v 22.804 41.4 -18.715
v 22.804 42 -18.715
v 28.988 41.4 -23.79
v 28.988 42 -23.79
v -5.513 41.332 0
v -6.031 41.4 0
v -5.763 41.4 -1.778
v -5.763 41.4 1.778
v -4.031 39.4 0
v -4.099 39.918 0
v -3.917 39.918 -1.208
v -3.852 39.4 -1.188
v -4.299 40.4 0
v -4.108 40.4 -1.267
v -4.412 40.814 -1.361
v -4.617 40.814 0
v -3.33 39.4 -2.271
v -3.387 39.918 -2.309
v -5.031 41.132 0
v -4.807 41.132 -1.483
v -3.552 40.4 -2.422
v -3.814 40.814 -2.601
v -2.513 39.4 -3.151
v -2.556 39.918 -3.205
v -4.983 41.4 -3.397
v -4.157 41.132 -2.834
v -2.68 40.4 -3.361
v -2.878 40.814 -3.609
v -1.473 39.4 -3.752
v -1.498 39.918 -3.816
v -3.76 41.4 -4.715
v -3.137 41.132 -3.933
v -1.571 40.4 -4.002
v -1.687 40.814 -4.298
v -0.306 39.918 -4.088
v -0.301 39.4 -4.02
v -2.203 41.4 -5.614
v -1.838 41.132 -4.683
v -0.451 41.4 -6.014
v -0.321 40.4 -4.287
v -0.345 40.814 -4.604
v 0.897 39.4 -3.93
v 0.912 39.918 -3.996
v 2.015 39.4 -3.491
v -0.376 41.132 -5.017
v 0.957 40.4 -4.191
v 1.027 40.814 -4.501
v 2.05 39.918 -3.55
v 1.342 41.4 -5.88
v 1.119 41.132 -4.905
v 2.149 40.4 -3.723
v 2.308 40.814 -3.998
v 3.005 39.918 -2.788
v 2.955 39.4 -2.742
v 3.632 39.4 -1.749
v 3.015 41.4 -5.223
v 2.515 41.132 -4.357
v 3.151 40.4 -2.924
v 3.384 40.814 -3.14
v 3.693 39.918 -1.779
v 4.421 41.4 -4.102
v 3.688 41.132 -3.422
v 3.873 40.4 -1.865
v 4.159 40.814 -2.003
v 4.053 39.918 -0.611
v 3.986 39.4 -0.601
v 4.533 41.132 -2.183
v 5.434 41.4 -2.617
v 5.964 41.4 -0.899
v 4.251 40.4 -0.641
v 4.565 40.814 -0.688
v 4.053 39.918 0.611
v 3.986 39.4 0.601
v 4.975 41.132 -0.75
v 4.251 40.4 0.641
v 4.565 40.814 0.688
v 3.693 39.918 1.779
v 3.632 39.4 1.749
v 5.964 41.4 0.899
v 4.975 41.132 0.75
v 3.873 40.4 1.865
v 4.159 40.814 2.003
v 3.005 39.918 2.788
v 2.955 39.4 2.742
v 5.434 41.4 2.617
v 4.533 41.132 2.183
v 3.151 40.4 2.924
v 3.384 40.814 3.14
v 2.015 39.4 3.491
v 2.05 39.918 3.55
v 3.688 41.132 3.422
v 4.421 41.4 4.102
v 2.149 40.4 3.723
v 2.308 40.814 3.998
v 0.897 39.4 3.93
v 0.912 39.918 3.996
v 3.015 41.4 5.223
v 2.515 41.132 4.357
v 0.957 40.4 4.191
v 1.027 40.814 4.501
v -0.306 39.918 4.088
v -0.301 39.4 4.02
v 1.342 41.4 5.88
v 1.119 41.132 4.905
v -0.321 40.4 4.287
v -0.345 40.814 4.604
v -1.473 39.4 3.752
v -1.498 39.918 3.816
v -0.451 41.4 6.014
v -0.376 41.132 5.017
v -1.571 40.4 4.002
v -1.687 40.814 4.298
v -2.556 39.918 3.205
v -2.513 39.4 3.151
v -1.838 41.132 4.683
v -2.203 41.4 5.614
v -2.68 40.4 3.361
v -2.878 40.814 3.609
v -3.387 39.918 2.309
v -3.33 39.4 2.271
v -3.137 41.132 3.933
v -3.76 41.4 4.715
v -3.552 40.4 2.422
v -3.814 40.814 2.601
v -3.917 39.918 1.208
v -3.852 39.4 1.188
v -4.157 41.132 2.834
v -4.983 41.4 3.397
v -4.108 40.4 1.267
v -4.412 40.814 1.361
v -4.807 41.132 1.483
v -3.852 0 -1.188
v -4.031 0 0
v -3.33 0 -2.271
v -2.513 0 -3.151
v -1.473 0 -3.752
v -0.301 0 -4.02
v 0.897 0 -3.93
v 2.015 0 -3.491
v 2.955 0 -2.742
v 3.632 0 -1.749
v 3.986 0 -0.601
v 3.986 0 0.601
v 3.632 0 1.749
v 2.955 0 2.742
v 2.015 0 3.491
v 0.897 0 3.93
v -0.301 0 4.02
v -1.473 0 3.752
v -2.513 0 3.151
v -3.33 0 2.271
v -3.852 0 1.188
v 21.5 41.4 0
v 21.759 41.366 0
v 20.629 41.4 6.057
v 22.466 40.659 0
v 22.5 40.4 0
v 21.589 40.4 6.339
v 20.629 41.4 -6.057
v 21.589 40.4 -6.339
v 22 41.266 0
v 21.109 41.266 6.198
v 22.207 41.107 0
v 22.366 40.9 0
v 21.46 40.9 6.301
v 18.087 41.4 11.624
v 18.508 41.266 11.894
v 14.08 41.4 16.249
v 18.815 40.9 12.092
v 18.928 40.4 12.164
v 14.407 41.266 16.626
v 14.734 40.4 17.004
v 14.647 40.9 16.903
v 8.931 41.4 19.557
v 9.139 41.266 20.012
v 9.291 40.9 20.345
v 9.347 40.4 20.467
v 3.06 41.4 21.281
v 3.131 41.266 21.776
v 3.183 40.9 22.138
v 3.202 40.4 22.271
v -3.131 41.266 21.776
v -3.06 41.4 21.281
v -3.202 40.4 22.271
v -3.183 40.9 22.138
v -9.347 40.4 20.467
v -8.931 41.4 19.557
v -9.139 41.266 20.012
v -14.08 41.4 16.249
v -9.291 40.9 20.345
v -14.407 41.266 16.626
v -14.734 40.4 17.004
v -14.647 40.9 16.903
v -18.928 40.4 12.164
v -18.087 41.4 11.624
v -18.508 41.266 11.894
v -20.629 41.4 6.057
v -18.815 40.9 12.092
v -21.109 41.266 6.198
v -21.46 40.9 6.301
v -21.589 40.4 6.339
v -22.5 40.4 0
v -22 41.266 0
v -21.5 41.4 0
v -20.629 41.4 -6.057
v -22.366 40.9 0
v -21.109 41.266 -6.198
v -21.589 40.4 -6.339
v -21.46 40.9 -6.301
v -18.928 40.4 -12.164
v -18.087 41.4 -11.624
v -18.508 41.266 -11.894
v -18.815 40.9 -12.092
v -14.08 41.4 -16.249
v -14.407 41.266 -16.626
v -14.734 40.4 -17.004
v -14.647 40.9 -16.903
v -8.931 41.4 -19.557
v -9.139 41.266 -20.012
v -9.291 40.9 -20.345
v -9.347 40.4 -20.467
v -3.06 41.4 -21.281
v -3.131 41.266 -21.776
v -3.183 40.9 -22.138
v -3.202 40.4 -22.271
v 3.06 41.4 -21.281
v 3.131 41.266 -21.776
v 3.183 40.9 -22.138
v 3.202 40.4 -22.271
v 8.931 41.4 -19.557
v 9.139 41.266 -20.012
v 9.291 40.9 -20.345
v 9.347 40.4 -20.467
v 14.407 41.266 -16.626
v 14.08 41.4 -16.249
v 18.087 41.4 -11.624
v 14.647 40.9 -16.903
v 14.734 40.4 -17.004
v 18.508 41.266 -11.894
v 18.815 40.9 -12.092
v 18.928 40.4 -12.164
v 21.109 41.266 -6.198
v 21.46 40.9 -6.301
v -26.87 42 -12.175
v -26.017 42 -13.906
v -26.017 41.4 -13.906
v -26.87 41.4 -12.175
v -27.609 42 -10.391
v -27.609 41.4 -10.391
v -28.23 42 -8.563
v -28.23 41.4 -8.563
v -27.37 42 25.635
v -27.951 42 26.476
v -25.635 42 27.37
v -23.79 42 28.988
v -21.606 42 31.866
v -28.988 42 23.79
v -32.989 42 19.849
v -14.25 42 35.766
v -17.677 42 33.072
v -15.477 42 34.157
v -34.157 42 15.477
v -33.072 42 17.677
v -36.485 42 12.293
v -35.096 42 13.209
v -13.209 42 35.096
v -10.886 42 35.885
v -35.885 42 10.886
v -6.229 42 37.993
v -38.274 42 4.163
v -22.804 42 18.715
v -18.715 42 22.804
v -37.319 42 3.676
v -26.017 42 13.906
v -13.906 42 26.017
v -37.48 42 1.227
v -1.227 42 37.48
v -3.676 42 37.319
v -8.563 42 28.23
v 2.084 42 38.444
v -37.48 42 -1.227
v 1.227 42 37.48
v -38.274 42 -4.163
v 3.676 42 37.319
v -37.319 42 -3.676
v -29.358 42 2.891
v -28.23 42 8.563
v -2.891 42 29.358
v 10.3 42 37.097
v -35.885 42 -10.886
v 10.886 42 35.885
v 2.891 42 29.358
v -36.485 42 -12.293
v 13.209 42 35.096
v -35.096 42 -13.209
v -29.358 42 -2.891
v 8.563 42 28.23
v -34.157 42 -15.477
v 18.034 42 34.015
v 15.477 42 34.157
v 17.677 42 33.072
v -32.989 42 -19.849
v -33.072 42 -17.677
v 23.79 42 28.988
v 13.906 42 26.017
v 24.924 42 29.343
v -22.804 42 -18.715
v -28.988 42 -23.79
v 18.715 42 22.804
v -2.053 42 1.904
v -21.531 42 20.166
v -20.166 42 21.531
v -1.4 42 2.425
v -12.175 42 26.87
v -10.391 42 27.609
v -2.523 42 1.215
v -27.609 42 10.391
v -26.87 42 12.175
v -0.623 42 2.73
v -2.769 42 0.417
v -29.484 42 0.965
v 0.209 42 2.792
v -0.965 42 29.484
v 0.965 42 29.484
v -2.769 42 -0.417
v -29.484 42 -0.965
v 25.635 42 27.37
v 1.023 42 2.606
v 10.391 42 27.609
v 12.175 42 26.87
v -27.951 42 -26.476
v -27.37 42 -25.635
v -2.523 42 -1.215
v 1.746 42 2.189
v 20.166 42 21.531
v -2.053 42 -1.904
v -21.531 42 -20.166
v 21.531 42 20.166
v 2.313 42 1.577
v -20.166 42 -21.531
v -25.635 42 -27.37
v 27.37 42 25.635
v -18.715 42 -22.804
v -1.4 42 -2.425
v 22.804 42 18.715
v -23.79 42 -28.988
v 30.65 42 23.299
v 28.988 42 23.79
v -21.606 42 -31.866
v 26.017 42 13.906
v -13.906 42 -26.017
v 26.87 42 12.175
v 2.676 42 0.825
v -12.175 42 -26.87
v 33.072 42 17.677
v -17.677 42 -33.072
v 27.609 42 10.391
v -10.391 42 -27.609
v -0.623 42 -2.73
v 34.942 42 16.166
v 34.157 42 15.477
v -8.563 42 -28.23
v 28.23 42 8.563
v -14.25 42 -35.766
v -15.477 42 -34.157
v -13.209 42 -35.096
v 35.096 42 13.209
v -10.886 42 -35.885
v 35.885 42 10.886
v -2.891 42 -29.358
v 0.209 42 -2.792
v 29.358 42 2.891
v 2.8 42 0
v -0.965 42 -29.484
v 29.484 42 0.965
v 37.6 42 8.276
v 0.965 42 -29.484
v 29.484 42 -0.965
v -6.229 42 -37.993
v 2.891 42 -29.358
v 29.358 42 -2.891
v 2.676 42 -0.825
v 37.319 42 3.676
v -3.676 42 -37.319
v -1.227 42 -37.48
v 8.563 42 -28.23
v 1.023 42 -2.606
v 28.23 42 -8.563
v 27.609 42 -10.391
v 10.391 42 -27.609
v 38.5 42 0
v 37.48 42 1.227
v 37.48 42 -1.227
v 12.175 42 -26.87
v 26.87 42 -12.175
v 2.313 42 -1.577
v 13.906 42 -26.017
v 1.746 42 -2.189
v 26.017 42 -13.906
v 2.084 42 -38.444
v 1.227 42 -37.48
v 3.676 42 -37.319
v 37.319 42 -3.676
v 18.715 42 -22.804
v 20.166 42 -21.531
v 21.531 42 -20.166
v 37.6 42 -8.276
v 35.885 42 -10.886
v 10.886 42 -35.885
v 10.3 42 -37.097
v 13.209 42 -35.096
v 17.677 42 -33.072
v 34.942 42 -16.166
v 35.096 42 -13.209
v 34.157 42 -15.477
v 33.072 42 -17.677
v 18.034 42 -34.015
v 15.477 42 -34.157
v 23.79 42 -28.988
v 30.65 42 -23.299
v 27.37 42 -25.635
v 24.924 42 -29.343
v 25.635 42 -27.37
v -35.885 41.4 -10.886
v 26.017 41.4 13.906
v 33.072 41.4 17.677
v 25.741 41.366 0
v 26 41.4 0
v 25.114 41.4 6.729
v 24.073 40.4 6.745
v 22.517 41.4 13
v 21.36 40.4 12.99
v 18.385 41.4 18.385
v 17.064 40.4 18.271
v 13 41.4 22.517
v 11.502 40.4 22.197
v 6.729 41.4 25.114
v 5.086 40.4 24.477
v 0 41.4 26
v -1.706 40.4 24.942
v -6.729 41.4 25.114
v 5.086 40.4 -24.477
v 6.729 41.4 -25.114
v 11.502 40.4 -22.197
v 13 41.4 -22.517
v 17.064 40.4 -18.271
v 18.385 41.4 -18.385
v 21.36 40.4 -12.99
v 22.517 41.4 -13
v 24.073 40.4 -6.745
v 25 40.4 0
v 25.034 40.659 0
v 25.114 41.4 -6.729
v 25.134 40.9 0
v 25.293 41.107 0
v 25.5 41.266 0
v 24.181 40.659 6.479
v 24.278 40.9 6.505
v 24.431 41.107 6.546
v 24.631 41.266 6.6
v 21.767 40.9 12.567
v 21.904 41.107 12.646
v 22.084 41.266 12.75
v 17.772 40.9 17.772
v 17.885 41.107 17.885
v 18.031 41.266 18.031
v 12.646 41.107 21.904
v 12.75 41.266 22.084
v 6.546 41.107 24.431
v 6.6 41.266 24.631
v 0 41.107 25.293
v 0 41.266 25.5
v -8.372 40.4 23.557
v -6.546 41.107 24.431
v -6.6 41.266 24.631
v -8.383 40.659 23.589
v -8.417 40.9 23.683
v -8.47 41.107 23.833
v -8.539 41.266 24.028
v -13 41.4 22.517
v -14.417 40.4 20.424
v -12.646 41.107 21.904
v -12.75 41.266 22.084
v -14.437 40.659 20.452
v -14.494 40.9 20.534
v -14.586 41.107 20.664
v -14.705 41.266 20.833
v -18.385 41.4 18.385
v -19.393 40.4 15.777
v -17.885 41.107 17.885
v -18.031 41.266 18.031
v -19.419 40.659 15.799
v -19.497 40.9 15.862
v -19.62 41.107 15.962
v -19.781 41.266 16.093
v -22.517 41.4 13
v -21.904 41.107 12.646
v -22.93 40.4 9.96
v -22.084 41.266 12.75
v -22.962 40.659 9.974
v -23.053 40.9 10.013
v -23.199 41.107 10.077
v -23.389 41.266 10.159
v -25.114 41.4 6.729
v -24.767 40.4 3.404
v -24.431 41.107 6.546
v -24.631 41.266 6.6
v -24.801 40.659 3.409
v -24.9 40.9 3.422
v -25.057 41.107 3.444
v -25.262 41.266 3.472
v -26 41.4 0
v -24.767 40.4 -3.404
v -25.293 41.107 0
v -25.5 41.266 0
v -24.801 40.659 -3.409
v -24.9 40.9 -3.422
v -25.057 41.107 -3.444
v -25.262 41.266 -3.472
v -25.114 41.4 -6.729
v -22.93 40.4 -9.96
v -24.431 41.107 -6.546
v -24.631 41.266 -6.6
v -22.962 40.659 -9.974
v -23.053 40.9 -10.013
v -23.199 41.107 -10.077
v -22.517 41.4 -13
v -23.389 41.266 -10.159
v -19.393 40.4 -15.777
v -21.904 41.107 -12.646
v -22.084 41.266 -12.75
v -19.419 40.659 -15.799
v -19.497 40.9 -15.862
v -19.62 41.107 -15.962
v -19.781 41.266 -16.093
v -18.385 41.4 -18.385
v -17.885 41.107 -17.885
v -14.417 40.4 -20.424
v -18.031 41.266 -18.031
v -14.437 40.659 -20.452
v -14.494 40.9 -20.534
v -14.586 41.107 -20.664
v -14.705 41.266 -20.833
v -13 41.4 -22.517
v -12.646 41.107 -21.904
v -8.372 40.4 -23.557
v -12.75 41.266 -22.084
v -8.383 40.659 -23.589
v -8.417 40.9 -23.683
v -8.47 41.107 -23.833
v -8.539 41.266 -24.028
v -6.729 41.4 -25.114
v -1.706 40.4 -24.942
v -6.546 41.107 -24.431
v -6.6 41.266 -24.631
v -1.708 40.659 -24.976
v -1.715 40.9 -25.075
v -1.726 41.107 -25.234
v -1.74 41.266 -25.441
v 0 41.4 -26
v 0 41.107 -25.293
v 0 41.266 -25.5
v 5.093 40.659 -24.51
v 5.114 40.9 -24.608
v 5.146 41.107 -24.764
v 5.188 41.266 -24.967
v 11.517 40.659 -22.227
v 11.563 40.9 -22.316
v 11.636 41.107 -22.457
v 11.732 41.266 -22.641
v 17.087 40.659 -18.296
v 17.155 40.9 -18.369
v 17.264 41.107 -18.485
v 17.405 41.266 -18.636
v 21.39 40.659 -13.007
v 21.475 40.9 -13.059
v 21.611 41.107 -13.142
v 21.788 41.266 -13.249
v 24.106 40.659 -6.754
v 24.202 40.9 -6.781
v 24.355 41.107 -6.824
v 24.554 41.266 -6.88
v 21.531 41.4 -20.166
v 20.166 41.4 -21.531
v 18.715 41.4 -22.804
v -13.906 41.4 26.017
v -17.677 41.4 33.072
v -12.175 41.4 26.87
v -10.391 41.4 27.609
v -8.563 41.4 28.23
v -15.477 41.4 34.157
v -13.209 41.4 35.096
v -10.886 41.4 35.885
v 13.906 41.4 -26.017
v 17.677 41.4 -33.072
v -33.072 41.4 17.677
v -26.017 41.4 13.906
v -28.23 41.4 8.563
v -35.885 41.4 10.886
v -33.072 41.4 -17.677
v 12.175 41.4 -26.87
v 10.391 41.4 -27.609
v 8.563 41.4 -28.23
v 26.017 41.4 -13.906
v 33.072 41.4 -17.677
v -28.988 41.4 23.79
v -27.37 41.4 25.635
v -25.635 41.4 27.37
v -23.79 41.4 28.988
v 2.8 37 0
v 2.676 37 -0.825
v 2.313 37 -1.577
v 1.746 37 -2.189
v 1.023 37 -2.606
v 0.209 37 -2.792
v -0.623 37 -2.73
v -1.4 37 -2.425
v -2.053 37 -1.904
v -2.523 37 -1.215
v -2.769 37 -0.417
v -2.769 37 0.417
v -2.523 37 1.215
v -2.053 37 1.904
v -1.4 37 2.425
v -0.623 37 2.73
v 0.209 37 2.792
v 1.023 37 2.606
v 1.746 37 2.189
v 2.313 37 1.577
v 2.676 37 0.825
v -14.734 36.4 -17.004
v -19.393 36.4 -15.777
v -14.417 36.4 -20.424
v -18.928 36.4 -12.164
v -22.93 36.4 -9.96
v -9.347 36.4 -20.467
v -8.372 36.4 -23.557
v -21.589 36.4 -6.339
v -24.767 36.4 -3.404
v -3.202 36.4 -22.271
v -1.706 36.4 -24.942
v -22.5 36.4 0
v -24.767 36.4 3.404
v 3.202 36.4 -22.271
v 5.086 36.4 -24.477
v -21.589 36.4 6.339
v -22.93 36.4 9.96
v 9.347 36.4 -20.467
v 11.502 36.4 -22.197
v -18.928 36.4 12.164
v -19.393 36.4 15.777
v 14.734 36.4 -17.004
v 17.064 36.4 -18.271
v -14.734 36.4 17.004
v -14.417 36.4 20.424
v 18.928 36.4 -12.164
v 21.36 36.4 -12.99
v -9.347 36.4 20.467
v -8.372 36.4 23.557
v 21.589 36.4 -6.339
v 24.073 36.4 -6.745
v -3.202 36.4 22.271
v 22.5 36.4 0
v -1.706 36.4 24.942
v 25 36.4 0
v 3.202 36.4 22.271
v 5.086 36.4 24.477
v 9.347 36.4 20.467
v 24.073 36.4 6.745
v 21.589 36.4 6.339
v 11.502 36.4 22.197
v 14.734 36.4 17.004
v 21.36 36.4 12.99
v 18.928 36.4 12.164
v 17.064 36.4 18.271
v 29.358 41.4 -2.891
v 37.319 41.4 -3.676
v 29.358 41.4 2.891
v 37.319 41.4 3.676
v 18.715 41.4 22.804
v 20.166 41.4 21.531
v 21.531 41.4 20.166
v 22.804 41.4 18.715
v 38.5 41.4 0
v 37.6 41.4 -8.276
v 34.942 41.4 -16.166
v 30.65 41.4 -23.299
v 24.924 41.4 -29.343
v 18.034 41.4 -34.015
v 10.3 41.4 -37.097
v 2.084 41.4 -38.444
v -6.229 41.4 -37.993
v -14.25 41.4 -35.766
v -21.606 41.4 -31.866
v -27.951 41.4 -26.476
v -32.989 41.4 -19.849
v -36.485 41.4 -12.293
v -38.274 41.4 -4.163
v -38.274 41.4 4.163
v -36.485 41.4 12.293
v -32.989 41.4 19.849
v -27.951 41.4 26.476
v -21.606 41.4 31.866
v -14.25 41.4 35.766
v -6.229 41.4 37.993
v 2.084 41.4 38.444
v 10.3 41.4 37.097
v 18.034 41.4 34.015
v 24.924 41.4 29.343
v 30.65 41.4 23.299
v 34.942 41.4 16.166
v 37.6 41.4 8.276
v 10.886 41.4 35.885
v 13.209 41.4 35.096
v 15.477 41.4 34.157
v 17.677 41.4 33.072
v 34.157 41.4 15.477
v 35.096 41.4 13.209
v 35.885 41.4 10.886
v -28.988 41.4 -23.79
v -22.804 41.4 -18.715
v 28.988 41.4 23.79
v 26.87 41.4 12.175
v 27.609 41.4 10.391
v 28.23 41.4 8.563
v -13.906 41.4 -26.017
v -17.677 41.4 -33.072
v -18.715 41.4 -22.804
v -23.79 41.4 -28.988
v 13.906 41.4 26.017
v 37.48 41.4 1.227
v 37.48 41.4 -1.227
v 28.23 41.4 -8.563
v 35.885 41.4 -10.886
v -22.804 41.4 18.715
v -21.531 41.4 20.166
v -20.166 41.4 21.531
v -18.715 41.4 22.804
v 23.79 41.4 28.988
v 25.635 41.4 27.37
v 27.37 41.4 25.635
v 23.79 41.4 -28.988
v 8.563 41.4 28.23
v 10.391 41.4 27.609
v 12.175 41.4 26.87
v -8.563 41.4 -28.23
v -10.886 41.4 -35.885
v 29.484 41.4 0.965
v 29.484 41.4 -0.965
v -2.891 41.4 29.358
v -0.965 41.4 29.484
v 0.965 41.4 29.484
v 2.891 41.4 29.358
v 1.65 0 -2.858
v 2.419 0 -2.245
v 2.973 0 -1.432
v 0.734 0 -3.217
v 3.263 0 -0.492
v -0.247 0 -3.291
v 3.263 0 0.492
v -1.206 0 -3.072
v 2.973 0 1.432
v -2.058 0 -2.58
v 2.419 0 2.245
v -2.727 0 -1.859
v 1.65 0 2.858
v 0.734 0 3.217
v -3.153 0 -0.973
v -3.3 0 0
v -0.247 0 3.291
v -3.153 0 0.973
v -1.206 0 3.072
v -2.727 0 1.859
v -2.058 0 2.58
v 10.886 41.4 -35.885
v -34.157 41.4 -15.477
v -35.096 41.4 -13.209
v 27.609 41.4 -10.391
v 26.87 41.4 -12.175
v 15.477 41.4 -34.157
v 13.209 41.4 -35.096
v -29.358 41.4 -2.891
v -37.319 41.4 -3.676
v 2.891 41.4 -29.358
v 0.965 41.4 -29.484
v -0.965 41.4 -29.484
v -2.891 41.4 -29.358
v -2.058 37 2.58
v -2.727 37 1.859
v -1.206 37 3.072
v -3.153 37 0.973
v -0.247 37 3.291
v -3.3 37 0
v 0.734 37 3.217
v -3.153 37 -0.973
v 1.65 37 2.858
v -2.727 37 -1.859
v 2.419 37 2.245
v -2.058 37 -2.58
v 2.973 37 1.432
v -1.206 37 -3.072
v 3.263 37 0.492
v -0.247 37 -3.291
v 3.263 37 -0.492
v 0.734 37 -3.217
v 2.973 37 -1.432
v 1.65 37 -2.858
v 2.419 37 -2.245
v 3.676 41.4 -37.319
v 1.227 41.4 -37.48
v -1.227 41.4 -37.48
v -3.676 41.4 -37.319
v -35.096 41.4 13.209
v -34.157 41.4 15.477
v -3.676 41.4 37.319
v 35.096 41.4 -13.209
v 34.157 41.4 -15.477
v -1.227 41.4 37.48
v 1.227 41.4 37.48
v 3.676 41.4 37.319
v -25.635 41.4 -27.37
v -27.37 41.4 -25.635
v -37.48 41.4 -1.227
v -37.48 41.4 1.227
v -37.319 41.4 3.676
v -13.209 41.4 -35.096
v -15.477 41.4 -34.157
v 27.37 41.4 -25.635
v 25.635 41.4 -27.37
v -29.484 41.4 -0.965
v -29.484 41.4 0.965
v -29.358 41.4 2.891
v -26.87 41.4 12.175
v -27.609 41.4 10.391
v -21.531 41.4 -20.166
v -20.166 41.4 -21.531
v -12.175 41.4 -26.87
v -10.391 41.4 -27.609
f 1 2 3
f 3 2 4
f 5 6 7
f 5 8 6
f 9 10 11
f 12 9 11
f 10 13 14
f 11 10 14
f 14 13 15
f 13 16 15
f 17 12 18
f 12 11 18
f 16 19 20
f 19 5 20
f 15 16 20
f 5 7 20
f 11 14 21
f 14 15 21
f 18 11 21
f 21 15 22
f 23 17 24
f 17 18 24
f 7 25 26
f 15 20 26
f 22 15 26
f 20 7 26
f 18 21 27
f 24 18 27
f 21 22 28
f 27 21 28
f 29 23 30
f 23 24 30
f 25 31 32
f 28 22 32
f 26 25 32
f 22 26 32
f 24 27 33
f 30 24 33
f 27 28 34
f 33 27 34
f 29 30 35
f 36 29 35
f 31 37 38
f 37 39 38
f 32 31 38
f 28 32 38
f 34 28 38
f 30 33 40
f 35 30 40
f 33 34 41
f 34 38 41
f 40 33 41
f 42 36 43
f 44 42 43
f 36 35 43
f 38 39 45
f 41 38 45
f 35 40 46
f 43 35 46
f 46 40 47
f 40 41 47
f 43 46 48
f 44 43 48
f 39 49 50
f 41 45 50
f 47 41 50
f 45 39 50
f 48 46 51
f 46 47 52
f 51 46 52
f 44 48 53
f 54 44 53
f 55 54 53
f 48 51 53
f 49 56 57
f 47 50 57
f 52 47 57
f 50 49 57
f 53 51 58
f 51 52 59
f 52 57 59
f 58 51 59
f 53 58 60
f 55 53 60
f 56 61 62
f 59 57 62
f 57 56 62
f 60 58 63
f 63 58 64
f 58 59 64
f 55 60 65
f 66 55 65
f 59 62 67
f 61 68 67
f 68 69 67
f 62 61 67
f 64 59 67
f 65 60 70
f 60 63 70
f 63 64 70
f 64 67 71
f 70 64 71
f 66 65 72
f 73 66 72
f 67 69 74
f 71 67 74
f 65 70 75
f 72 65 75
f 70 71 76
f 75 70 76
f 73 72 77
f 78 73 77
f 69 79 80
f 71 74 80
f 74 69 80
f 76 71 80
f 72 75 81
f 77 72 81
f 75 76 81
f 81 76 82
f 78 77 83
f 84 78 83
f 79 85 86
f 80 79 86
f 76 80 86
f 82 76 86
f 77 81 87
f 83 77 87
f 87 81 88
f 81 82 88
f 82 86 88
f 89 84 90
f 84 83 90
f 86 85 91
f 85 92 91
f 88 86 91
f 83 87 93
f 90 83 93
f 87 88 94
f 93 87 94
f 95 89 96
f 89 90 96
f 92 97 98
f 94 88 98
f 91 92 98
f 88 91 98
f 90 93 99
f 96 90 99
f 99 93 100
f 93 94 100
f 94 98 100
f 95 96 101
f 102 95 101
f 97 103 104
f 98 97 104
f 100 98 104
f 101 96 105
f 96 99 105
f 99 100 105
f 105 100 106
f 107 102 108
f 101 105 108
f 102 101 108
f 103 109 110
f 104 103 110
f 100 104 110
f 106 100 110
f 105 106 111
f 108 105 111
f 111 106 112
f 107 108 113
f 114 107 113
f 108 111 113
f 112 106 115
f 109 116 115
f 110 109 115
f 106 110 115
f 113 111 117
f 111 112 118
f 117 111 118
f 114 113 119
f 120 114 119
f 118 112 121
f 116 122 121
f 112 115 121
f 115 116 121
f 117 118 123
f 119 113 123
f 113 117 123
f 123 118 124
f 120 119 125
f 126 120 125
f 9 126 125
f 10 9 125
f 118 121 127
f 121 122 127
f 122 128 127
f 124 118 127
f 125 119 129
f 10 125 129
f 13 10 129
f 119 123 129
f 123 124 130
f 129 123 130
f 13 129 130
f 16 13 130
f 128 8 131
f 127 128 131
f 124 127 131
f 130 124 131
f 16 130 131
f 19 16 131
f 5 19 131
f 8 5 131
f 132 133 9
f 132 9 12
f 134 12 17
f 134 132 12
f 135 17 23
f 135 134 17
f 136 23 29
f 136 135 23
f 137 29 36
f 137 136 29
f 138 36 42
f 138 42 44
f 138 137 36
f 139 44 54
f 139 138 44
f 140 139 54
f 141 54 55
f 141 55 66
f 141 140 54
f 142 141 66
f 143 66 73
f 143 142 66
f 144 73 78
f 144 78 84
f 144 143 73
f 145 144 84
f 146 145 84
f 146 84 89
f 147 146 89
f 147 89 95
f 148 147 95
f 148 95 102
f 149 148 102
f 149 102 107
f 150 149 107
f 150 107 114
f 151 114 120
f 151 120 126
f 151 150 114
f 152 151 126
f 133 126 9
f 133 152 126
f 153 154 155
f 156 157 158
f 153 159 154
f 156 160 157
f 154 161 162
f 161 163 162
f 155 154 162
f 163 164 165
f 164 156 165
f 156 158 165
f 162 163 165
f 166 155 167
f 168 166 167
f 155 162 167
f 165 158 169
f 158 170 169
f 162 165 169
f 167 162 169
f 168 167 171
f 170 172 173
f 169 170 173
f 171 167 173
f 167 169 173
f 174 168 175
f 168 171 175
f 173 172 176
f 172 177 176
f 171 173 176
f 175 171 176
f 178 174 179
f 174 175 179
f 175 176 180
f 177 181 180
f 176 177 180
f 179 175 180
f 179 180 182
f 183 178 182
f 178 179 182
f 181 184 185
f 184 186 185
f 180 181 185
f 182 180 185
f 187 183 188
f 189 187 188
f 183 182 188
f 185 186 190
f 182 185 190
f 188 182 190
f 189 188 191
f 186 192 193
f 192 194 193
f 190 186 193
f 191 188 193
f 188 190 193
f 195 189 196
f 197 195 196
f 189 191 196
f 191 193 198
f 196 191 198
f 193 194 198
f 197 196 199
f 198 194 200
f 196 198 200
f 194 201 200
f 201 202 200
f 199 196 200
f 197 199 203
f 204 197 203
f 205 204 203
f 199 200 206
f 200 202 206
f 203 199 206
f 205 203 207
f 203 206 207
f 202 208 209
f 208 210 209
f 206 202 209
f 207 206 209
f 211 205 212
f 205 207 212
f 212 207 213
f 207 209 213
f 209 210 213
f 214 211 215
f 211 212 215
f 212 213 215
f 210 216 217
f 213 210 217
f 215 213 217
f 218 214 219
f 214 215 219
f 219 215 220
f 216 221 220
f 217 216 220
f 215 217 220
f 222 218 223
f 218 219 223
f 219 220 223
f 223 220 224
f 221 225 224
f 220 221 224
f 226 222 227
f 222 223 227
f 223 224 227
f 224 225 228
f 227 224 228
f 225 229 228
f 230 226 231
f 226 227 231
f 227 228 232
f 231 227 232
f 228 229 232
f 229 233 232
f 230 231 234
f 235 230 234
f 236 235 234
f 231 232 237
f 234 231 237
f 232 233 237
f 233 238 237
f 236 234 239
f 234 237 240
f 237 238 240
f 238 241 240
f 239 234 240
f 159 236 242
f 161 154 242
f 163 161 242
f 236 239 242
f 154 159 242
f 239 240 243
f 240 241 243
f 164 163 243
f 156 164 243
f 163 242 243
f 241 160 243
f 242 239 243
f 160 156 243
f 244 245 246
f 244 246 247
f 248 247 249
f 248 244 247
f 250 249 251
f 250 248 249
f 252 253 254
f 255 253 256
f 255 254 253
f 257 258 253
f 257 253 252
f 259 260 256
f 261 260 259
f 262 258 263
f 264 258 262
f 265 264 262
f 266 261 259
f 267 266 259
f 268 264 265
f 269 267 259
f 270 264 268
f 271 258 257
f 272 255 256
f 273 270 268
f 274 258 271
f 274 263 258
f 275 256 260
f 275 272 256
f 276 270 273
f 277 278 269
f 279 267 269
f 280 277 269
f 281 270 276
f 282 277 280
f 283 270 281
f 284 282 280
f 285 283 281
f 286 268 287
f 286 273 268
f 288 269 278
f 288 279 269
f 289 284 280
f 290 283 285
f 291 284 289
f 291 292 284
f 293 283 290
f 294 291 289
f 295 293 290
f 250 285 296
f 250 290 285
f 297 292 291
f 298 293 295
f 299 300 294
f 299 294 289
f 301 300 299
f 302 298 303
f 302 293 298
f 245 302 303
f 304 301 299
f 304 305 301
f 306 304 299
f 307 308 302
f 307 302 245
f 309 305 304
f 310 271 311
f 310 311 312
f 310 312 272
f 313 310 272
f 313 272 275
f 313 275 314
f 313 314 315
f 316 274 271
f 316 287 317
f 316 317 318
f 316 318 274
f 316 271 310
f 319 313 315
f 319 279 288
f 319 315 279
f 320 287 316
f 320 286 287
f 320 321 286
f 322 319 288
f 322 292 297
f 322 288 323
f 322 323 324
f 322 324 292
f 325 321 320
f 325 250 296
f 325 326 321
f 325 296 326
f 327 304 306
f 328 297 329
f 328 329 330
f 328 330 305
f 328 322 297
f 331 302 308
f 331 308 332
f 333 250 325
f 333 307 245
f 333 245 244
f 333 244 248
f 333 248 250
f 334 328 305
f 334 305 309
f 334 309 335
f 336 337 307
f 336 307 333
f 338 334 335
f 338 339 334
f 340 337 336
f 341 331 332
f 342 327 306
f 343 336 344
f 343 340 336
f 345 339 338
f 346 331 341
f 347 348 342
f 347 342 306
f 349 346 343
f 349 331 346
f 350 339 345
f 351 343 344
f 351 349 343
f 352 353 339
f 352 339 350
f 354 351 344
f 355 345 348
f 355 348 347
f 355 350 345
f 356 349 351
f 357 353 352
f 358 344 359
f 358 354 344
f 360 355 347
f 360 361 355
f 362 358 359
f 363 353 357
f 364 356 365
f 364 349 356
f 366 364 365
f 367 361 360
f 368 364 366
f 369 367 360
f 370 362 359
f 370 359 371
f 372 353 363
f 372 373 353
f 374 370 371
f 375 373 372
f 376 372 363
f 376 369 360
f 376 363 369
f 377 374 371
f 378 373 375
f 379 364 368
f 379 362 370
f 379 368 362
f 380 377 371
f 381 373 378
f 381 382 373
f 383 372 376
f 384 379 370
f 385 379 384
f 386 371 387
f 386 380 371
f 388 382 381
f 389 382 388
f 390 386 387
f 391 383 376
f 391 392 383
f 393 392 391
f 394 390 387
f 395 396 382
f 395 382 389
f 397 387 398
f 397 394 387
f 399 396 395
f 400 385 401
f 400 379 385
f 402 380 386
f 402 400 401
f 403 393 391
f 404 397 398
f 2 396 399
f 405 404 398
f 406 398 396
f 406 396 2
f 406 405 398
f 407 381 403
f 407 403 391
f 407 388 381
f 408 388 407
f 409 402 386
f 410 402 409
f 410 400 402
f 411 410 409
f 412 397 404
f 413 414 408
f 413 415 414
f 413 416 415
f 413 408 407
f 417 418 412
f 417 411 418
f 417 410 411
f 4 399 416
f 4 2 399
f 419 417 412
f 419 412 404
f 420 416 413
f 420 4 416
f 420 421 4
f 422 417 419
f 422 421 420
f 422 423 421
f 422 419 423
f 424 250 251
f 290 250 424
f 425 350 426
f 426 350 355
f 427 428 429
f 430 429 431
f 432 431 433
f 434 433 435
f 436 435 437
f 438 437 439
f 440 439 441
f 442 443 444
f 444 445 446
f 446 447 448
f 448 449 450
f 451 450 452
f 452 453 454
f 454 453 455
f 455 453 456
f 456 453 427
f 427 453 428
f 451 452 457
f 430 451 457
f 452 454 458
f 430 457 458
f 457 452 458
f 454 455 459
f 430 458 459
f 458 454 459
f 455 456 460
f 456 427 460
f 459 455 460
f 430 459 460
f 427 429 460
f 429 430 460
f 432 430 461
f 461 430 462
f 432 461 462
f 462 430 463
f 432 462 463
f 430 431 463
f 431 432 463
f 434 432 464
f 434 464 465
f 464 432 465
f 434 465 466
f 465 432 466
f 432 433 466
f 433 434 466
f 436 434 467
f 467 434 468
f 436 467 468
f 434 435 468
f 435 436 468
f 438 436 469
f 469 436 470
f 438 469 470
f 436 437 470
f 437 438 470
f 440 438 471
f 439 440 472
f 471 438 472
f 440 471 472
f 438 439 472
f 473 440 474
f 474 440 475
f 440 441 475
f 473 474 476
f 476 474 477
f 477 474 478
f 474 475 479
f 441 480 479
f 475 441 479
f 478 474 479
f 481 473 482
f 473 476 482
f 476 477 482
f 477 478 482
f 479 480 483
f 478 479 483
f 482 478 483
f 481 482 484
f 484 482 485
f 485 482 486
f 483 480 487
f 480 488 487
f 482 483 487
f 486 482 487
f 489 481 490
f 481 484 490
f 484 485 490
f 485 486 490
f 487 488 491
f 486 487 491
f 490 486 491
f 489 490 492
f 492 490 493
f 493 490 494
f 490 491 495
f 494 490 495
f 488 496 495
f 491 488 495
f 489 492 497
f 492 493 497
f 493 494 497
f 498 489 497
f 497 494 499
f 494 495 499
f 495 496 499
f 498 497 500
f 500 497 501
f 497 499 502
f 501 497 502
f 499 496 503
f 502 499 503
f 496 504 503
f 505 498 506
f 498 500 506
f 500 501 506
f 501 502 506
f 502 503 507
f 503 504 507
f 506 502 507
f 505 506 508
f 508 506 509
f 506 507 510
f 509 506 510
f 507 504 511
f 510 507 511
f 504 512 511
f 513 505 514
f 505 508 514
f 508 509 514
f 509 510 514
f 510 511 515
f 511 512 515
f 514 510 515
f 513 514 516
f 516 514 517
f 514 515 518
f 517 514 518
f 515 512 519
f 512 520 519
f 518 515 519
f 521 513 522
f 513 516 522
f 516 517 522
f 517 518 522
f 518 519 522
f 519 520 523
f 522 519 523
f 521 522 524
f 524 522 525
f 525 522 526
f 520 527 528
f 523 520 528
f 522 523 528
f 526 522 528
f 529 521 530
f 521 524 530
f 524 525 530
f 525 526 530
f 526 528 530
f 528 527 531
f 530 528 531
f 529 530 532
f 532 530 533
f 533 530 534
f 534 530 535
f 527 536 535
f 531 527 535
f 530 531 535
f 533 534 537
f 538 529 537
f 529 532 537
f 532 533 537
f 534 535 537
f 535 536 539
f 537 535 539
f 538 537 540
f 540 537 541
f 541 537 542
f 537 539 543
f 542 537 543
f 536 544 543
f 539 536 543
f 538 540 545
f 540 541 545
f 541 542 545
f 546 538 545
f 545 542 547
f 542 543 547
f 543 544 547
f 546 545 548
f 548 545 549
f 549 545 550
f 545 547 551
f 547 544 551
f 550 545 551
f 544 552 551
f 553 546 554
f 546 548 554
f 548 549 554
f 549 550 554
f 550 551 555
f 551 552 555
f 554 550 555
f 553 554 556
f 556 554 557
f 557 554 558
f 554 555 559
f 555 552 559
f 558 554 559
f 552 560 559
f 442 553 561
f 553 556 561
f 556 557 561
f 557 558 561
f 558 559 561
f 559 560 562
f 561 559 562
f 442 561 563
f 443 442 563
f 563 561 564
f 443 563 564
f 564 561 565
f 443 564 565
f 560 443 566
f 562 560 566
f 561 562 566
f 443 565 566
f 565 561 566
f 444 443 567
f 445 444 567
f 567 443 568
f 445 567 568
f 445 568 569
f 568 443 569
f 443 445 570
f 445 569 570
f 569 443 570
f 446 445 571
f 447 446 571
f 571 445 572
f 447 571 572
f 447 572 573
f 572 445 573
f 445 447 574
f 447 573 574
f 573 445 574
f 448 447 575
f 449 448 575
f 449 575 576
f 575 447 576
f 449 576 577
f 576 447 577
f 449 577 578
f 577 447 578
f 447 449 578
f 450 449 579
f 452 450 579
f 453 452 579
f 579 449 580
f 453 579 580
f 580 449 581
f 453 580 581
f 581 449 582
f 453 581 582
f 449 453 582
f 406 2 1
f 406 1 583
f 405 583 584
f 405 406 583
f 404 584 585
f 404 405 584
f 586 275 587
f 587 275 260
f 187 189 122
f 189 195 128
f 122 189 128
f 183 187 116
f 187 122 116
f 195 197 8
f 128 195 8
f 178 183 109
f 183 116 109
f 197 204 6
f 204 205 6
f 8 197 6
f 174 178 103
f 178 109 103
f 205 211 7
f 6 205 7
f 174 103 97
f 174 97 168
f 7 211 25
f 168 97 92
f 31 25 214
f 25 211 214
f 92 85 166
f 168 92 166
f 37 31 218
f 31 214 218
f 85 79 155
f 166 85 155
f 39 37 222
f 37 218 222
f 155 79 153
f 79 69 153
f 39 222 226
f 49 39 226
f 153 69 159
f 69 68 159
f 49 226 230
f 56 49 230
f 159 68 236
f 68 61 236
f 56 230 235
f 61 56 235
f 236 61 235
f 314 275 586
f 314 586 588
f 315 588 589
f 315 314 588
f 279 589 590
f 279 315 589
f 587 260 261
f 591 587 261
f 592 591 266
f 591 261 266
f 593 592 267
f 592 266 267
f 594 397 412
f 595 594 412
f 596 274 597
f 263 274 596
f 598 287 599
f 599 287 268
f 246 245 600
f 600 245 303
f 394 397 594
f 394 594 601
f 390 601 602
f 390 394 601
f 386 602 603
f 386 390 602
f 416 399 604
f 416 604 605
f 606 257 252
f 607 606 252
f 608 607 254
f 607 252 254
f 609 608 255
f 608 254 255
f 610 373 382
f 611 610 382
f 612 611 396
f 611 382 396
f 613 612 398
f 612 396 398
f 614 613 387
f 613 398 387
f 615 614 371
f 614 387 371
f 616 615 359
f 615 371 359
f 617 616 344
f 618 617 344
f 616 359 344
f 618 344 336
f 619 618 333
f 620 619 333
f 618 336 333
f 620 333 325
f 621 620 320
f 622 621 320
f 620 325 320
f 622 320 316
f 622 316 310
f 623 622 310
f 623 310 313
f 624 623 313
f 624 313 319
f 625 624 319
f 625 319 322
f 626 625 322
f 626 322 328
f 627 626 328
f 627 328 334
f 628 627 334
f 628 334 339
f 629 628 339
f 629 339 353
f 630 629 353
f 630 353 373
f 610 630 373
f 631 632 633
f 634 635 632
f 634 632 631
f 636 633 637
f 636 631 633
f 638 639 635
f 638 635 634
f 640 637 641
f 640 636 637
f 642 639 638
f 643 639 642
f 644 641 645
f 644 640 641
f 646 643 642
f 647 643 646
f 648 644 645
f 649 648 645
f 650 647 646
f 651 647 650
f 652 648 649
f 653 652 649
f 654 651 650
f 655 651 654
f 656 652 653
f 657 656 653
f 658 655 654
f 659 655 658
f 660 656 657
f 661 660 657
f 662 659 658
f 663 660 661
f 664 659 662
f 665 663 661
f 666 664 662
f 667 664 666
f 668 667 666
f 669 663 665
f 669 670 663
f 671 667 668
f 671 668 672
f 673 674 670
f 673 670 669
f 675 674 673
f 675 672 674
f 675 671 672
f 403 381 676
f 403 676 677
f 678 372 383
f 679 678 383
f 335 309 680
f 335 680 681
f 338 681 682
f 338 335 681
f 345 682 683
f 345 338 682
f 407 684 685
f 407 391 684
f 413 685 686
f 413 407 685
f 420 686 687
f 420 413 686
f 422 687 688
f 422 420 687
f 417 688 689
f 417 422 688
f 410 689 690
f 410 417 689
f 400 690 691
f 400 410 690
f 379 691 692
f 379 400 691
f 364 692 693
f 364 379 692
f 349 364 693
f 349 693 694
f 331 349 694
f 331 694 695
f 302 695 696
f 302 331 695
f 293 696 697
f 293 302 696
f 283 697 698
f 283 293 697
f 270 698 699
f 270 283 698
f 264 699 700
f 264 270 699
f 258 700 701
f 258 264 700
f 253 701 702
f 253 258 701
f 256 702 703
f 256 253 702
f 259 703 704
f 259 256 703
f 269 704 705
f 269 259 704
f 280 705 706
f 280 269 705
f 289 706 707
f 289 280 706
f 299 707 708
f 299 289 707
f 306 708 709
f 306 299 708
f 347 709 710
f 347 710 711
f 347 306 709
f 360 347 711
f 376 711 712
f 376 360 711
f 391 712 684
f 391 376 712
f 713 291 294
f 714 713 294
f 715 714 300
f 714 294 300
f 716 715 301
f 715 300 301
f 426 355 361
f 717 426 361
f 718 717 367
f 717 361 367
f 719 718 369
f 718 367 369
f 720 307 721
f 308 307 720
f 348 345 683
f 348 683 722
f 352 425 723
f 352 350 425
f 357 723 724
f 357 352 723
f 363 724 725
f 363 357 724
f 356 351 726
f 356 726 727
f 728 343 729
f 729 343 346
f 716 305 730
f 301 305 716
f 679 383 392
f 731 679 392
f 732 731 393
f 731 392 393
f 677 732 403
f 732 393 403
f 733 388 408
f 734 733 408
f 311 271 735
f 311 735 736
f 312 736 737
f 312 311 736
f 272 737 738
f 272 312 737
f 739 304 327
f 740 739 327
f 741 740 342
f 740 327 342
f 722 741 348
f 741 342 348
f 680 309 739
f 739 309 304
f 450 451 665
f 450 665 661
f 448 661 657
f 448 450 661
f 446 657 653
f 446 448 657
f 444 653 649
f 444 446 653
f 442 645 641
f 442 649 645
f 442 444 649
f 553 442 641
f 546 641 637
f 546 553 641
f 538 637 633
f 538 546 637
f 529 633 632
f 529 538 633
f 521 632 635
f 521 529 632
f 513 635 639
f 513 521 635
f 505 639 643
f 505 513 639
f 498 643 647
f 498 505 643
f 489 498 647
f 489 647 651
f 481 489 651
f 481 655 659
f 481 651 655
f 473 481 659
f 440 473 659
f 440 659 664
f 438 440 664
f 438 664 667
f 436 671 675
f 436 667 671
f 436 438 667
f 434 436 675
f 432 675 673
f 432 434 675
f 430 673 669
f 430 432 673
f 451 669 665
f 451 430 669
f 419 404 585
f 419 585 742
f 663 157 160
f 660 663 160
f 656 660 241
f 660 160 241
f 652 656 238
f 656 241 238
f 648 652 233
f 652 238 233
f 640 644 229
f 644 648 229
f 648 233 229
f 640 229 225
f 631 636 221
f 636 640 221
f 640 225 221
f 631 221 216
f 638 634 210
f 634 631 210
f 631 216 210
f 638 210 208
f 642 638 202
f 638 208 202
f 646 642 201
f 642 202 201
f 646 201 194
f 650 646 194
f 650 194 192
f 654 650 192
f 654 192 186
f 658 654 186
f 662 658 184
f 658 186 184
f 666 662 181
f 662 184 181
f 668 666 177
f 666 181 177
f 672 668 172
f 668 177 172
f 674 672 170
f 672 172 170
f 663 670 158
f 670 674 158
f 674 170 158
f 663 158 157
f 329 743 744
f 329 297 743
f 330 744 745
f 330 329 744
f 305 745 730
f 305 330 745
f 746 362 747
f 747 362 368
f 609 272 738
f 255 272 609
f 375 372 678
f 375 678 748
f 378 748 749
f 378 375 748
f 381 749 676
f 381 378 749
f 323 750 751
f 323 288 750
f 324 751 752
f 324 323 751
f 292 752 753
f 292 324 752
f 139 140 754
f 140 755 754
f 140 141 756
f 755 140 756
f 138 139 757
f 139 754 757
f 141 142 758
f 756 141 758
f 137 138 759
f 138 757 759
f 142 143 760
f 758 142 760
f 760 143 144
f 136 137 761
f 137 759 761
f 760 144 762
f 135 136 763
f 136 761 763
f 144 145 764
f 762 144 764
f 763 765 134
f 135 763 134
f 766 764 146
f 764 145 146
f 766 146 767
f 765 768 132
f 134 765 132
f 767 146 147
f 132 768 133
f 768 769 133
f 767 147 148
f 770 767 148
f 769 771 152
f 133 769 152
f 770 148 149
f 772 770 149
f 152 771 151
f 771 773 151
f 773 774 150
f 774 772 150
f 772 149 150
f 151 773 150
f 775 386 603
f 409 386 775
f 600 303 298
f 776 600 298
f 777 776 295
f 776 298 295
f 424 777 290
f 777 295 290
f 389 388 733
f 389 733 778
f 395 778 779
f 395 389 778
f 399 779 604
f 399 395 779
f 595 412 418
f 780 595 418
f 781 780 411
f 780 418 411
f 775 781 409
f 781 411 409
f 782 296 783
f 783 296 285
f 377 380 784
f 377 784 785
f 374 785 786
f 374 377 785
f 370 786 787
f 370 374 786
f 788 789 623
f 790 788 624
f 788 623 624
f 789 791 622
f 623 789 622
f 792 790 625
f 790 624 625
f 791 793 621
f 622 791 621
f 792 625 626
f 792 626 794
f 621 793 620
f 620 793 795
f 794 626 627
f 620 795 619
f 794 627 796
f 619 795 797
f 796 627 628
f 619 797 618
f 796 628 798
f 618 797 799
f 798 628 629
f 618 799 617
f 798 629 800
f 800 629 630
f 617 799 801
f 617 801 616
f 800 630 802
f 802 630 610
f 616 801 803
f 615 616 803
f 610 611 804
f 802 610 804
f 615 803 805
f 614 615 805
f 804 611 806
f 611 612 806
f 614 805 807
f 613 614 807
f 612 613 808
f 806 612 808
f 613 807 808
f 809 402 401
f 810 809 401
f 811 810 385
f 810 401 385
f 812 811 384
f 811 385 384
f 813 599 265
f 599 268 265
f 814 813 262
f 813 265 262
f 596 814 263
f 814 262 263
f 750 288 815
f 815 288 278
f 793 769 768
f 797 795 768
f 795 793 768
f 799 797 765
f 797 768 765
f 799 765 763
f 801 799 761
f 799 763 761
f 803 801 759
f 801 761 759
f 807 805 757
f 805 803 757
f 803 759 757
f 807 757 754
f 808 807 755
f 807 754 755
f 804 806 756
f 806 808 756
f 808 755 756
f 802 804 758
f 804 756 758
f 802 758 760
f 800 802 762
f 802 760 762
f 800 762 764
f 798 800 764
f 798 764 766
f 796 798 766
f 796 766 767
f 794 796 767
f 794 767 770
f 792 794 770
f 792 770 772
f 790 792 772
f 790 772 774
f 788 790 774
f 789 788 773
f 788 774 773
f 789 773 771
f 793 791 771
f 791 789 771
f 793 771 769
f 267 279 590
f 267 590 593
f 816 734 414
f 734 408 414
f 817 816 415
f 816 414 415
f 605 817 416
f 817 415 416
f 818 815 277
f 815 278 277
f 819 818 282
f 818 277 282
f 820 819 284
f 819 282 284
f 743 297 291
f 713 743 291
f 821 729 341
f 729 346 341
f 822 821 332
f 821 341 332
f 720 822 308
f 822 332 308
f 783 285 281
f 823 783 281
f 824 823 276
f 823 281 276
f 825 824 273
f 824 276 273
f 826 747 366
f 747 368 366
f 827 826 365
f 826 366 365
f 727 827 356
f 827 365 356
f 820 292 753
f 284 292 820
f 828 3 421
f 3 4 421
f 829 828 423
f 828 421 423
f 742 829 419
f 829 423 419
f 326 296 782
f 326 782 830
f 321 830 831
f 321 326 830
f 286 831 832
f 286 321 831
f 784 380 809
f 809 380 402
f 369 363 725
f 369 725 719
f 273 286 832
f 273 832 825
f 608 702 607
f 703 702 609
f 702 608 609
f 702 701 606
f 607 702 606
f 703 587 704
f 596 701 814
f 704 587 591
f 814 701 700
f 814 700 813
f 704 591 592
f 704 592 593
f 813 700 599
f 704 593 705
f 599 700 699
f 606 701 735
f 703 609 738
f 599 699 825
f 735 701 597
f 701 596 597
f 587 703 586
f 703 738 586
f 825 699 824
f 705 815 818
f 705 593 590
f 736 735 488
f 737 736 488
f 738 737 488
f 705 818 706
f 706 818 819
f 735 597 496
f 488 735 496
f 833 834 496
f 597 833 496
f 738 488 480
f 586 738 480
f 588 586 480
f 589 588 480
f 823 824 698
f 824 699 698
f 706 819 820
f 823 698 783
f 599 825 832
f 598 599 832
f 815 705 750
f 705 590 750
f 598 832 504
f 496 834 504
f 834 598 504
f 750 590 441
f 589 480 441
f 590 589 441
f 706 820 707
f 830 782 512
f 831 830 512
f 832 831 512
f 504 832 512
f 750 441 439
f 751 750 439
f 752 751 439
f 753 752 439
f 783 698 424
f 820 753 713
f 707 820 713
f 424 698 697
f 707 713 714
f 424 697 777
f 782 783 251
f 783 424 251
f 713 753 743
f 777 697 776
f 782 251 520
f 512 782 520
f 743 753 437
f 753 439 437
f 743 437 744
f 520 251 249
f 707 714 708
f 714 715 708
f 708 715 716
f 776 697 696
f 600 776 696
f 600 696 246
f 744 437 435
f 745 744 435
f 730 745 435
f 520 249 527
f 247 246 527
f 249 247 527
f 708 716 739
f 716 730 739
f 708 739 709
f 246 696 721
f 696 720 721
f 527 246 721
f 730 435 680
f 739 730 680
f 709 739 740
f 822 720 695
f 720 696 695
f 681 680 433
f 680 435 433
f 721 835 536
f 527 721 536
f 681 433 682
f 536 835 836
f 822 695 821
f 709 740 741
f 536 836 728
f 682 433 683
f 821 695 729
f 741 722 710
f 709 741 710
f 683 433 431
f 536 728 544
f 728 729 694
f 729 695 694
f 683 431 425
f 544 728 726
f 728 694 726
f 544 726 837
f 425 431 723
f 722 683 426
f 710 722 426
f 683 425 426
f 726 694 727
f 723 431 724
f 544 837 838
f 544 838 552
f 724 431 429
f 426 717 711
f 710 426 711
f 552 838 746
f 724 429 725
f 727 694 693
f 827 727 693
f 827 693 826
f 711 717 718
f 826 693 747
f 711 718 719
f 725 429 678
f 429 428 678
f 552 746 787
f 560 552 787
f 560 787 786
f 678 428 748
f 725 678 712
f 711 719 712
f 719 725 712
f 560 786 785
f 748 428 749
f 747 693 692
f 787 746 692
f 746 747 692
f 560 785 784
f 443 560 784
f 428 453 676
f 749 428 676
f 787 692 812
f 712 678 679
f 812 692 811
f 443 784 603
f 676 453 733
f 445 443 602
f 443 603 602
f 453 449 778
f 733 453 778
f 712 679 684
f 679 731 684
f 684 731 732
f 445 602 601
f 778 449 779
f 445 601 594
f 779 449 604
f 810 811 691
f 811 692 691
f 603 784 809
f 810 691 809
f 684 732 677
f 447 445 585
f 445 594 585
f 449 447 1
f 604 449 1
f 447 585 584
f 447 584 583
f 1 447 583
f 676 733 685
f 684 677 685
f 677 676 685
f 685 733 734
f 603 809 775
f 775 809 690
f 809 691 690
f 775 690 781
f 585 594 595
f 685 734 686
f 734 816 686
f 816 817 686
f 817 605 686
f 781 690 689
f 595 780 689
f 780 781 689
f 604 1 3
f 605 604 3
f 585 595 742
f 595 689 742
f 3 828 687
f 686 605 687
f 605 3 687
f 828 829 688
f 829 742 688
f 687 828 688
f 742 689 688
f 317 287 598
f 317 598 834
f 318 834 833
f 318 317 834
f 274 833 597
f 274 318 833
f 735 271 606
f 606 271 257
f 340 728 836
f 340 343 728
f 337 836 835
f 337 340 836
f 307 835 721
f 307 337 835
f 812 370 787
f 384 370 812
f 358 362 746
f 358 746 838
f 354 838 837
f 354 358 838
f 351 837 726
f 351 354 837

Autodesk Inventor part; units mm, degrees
ref_plane "YZ Plane" through (0, 0, 0) normal (1, 0, 0) x (0, 1, 0)
ref_plane "XZ Plane" through (0, 0, 0) normal (0, 1, 0) x (-1, 0, 0)
ref_plane "XY Plane" through (0, 0, 0) normal (0, 0, 1) x (1, 0, 0)
sketch "Sketch1" plane through (0, 0, 0) normal (0, 1, 0) x (-1, 0, 0)
  circle A0 centre (0, 0) radius 4.0309
  circle A1 centre (0, 0) radius 3.3
  dimension "d0" = 6.6
extrude "Extrusion1" add sketch "Sketch1" along normal blind 42
sketch "Sketch2" plane through (0, 42, 0) normal (0, 1, 0) x (1, 0, 0)
  circle A0 centre (0, 0) radius 4.0309 projected
  circle A1 centre (0, 0) radius 3.3 projected
  circle A2 centre (0, 0) radius 2.8
  dimension "d3" = 5.6
extrude "Extrusion2" add sketch "Sketch2" against normal blind 5 contours A1
sketch "Sketch3" plane through (0, 42, 0) normal (0, 1, 0) x (1, 0, 0)
  circle A0 centre (0, 0) radius 38.5
  circle A1 centre (0, 0) radius 25
  circle A2 centre (0, 0) radius 4.0309 projected
  circle A3 centre (0, 0) radius 2.8 projected
  line L0 (0, 4.0309) -> (38.2884, 4.0309)
  line L1 (0, -4.0309) -> (38.2884, -4.0309)
  line L2 (-3.4908, -2.0154) -> (-22.635, 31.1433)
  line L3 (3.4908, 2.0154) -> (-15.6534, 35.1742)
  line L4 (3.4908, -2.0154) -> (-15.6534, -35.1742)
  line L5 (-3.4908, 2.0154) -> (-22.635, -31.1433)
  point P0 (24.6729, 4.0309)
  point P1 (24.6729, -4.0309)
  point P2 (-4.6544, 0)
  point P3 (-3.4908, 2.0154)
  point P4 (2.3272, 4.0309)
  point P5 (-8.8456, 23.3828)
  point P6 (-15.8273, 19.3519)
  point P7 (-15.8273, -19.3519)
  point P8 (-8.8456, -23.3828)
  point P9 (2.3272, -4.0309)
  point P10 (-3.4908, -2.0154)
  point P11 (-22.635, -31.1433)
  point P12 (-22.635, 31.1433)
  point P13 (3.4908, -2.0154)
  point P14 (-15.6534, -35.1742)
  point P15 (-15.6534, 35.1742)
  dimension "d10" = 77
  dimension "d11" = 50
  dimension "d28" = 360
extrude "Extrusion3" add sketch "Sketch3" against normal blind 0.6 contours A0 L1 A1 L0 | L0 A1 L3 A0 | A0 L4 A1 L1 | L3 A1 L2 A0 | L0 L3 A1 | A1 L1 L4 A2 L3 L0 | A0 L5 A1 L4 | A1 L4 L1 | L2 A1 L5 A0 | L3 L0 A2 L5 L2 A1 | L3 A2 L0 | A1 L5 L2 A2 L1 L4 | L1 A2 L4 | L2 L5 A1 | A2 | L5 A2 L2 | A3
fillet "Fillet1" [suppressed]
sketch "Sketch4" plane through (0, 42, 0) normal (0, 1, 0) x (1, 0, 0)
  circle A0 centre (0, 0) radius 39.5 projected
  circle A1 centre (0, 0) radius 37.5
  circle A2 centre (0, 0) radius 29.5
  line L0 (-39.5, 0) -> (0, 0)
  line L1 (0, 0) -> (-37.3194, 3.6756)
  line L2 (0, 0) -> (-37.3194, -3.6756)
  line L3 (0, 0) -> (-35.8853, -10.8857)
  line L4 (0, 0) -> (-33.072, -17.6774)
  line L5 (0, 0) -> (-28.9879, -23.7897)
  line L6 (0, 0) -> (-23.7897, -28.9879)
  line L7 (0, 0) -> (-17.6774, -33.072)
  line L8 (0, 0) -> (-10.8857, -35.8853)
  line L9 (0, 0) -> (-3.6756, -37.3194)
  line L10 (0, 0) -> (3.6756, -37.3194)
  line L11 (0, 0) -> (10.8857, -35.8853)
  line L12 (0, 0) -> (17.6774, -33.072)
  line L13 (0, 0) -> (23.7897, -28.9879)
  line L14 (0, 0) -> (28.9879, -23.7897)
  line L15 (0, 0) -> (33.072, -17.6774)
  line L16 (0, 0) -> (35.8853, -10.8857)
  line L17 (0, 0) -> (37.3194, -3.6756)
  line L18 (0, 0) -> (37.3194, 3.6756)
  line L19 (0, 0) -> (35.8853, 10.8857)
  line L20 (0, 0) -> (33.072, 17.6774)
  line L21 (0, 0) -> (28.9879, 23.7897)
  line L22 (0, 0) -> (23.7897, 28.9879)
  line L23 (0, 0) -> (17.6774, 33.072)
  line L24 (0, 0) -> (10.8857, 35.8853)
  line L25 (0, 0) -> (3.6756, 37.3194)
  line L26 (0, 0) -> (-3.6756, 37.3194)
  line L27 (0, 0) -> (-10.8857, 35.8853)
  line L28 (0, 0) -> (-17.6774, 33.072)
  line L29 (0, 0) -> (-23.7897, 28.9879)
  line L30 (0, 0) -> (-28.9879, 23.7897)
  line L31 (0, 0) -> (-33.072, 17.6774)
  line L32 (0, 0) -> (-35.8853, 10.8857)
  point P0 (-23.7897, -28.9879)
  point P1 (-18.7146, -22.8038)
  point P2 (-22.8038, -18.7146)
  point P3 (-28.9879, -23.7897)
  point P4 (-10.8857, -35.8853)
  point P5 (-8.5634, -28.2297)
  point P6 (-13.9062, -26.0167)
  point P7 (-17.6774, -33.072)
  point P8 (3.6756, -37.3194)
  point P9 (2.8915, -29.3579)
  point P10 (-2.8915, -29.3579)
  point P11 (17.6774, -33.072)
  point P12 (13.9062, -26.0167)
  point P13 (8.5634, -28.2297)
  point P14 (10.8857, -35.8853)
  point P15 (28.9879, -23.7897)
  point P16 (22.8038, -18.7146)
  point P17 (18.7146, -22.8038)
  point P18 (23.7897, -28.9879)
  point P19 (35.8853, -10.8857)
  point P20 (28.2297, -8.5634)
  point P21 (26.0167, -13.9062)
  point P22 (33.072, -17.6774)
  point P23 (-33.072, -17.6774)
  point P24 (-26.0167, -13.9062)
  point P25 (-28.2297, -8.5634)
  point P26 (-35.8853, -10.8857)
  point P27 (-29.3579, -2.8915)
  point P28 (-29.3579, 2.8915)
  point P29 (37.3194, 3.6756)
  point P30 (29.3579, 2.8915)
  point P31 (29.3579, -2.8915)
  point P32 (37.3194, -3.6756)
  point P33 (33.072, 17.6774)
  point P34 (26.0167, 13.9062)
  point P35 (28.2297, 8.5634)
  point P36 (35.8853, 10.8857)
  point P37 (23.7897, 28.9879)
  point P38 (18.7146, 22.8038)
  point P39 (22.8038, 18.7146)
  point P40 (28.9879, 23.7897)
  point P41 (10.8857, 35.8853)
  point P42 (8.5634, 28.2297)
  point P43 (13.9062, 26.0167)
  point P44 (17.6774, 33.072)
  point P45 (-3.6756, 37.3194)
  point P46 (-2.8915, 29.3579)
  point P47 (2.8915, 29.3579)
  point P48 (3.6756, 37.3194)
  point P49 (-17.6774, 33.072)
  point P50 (-13.9062, 26.0167)
  point P51 (-8.5634, 28.2297)
  point P52 (-10.8857, 35.8853)
  point P53 (-35.8853, 10.8857)
  point P54 (-28.2297, 8.5634)
  point P55 (-26.0167, 13.9062)
  point P56 (-33.072, 17.6774)
  point P57 (-28.9879, 23.7897)
  point P58 (-22.8038, 18.7146)
  point P59 (-18.7146, 22.8038)
  point P60 (-23.7897, 28.9879)
  dimension "d15" = 2
  dimension "d16" = 8
  dimension "d17" = 5.625
  dimension "d19" = 5.625
  dimension "d22" = 360
extrude "Extrusion4" cut sketch "Sketch4" against normal through all contours A1 L1 A2 L0 | L0 A2 L2 A1 | A1 L31 A2 L32 | L3 A2 L4 A1 | A2 L6 A1 L5 | A2 L8 A1 L7 | A2 L10 A1 L9 | A2 L12 A1 L11 | A2 L14 A1 L13 | A2 L16 A1 L15 | A2 L18 A1 L17 | A2 L20 A1 L19 | A2 L22 A1 L21 | A2 L24 A1 L23 | A2 L26 A1 L25 | A2 L28 A1 L27 | A2 L30 A1 L29
fillet "Fillet2" [suppressed]
sketch "Sketch5" plane through (0, 41.4, 0) normal (0, -1, 0) x (1, 0, 0)
  circle A0 centre (0, 0) radius 2.8 projected
extrude "Extrusion5" cut sketch "Sketch5" against normal blind 0.6
fillet "Fillet3" radius 2 1 edges at (4.0309, 41.4, 0)
sketch "Sketch6" plane through (0, 41.4, 0) normal (0, -1, 0) x (1, 0, 0)
  circle A0 centre (0, 0) radius 25
  circle A1 centre (0, 0) radius 4.0309 projected
  circle A2 centre (0, 0) radius 22.5
  dimension "d34" = 50
  dimension "d35" = 45
extrude "Extrusion6" add sketch "Sketch6" along normal blind 5 contours A0
fillet "Fillet4" radius 1 2 edges at (-22.5, 41.4, 0) (-25, 41.4, 0)
properties part number "Eje_econder" material "PET Plastic"
